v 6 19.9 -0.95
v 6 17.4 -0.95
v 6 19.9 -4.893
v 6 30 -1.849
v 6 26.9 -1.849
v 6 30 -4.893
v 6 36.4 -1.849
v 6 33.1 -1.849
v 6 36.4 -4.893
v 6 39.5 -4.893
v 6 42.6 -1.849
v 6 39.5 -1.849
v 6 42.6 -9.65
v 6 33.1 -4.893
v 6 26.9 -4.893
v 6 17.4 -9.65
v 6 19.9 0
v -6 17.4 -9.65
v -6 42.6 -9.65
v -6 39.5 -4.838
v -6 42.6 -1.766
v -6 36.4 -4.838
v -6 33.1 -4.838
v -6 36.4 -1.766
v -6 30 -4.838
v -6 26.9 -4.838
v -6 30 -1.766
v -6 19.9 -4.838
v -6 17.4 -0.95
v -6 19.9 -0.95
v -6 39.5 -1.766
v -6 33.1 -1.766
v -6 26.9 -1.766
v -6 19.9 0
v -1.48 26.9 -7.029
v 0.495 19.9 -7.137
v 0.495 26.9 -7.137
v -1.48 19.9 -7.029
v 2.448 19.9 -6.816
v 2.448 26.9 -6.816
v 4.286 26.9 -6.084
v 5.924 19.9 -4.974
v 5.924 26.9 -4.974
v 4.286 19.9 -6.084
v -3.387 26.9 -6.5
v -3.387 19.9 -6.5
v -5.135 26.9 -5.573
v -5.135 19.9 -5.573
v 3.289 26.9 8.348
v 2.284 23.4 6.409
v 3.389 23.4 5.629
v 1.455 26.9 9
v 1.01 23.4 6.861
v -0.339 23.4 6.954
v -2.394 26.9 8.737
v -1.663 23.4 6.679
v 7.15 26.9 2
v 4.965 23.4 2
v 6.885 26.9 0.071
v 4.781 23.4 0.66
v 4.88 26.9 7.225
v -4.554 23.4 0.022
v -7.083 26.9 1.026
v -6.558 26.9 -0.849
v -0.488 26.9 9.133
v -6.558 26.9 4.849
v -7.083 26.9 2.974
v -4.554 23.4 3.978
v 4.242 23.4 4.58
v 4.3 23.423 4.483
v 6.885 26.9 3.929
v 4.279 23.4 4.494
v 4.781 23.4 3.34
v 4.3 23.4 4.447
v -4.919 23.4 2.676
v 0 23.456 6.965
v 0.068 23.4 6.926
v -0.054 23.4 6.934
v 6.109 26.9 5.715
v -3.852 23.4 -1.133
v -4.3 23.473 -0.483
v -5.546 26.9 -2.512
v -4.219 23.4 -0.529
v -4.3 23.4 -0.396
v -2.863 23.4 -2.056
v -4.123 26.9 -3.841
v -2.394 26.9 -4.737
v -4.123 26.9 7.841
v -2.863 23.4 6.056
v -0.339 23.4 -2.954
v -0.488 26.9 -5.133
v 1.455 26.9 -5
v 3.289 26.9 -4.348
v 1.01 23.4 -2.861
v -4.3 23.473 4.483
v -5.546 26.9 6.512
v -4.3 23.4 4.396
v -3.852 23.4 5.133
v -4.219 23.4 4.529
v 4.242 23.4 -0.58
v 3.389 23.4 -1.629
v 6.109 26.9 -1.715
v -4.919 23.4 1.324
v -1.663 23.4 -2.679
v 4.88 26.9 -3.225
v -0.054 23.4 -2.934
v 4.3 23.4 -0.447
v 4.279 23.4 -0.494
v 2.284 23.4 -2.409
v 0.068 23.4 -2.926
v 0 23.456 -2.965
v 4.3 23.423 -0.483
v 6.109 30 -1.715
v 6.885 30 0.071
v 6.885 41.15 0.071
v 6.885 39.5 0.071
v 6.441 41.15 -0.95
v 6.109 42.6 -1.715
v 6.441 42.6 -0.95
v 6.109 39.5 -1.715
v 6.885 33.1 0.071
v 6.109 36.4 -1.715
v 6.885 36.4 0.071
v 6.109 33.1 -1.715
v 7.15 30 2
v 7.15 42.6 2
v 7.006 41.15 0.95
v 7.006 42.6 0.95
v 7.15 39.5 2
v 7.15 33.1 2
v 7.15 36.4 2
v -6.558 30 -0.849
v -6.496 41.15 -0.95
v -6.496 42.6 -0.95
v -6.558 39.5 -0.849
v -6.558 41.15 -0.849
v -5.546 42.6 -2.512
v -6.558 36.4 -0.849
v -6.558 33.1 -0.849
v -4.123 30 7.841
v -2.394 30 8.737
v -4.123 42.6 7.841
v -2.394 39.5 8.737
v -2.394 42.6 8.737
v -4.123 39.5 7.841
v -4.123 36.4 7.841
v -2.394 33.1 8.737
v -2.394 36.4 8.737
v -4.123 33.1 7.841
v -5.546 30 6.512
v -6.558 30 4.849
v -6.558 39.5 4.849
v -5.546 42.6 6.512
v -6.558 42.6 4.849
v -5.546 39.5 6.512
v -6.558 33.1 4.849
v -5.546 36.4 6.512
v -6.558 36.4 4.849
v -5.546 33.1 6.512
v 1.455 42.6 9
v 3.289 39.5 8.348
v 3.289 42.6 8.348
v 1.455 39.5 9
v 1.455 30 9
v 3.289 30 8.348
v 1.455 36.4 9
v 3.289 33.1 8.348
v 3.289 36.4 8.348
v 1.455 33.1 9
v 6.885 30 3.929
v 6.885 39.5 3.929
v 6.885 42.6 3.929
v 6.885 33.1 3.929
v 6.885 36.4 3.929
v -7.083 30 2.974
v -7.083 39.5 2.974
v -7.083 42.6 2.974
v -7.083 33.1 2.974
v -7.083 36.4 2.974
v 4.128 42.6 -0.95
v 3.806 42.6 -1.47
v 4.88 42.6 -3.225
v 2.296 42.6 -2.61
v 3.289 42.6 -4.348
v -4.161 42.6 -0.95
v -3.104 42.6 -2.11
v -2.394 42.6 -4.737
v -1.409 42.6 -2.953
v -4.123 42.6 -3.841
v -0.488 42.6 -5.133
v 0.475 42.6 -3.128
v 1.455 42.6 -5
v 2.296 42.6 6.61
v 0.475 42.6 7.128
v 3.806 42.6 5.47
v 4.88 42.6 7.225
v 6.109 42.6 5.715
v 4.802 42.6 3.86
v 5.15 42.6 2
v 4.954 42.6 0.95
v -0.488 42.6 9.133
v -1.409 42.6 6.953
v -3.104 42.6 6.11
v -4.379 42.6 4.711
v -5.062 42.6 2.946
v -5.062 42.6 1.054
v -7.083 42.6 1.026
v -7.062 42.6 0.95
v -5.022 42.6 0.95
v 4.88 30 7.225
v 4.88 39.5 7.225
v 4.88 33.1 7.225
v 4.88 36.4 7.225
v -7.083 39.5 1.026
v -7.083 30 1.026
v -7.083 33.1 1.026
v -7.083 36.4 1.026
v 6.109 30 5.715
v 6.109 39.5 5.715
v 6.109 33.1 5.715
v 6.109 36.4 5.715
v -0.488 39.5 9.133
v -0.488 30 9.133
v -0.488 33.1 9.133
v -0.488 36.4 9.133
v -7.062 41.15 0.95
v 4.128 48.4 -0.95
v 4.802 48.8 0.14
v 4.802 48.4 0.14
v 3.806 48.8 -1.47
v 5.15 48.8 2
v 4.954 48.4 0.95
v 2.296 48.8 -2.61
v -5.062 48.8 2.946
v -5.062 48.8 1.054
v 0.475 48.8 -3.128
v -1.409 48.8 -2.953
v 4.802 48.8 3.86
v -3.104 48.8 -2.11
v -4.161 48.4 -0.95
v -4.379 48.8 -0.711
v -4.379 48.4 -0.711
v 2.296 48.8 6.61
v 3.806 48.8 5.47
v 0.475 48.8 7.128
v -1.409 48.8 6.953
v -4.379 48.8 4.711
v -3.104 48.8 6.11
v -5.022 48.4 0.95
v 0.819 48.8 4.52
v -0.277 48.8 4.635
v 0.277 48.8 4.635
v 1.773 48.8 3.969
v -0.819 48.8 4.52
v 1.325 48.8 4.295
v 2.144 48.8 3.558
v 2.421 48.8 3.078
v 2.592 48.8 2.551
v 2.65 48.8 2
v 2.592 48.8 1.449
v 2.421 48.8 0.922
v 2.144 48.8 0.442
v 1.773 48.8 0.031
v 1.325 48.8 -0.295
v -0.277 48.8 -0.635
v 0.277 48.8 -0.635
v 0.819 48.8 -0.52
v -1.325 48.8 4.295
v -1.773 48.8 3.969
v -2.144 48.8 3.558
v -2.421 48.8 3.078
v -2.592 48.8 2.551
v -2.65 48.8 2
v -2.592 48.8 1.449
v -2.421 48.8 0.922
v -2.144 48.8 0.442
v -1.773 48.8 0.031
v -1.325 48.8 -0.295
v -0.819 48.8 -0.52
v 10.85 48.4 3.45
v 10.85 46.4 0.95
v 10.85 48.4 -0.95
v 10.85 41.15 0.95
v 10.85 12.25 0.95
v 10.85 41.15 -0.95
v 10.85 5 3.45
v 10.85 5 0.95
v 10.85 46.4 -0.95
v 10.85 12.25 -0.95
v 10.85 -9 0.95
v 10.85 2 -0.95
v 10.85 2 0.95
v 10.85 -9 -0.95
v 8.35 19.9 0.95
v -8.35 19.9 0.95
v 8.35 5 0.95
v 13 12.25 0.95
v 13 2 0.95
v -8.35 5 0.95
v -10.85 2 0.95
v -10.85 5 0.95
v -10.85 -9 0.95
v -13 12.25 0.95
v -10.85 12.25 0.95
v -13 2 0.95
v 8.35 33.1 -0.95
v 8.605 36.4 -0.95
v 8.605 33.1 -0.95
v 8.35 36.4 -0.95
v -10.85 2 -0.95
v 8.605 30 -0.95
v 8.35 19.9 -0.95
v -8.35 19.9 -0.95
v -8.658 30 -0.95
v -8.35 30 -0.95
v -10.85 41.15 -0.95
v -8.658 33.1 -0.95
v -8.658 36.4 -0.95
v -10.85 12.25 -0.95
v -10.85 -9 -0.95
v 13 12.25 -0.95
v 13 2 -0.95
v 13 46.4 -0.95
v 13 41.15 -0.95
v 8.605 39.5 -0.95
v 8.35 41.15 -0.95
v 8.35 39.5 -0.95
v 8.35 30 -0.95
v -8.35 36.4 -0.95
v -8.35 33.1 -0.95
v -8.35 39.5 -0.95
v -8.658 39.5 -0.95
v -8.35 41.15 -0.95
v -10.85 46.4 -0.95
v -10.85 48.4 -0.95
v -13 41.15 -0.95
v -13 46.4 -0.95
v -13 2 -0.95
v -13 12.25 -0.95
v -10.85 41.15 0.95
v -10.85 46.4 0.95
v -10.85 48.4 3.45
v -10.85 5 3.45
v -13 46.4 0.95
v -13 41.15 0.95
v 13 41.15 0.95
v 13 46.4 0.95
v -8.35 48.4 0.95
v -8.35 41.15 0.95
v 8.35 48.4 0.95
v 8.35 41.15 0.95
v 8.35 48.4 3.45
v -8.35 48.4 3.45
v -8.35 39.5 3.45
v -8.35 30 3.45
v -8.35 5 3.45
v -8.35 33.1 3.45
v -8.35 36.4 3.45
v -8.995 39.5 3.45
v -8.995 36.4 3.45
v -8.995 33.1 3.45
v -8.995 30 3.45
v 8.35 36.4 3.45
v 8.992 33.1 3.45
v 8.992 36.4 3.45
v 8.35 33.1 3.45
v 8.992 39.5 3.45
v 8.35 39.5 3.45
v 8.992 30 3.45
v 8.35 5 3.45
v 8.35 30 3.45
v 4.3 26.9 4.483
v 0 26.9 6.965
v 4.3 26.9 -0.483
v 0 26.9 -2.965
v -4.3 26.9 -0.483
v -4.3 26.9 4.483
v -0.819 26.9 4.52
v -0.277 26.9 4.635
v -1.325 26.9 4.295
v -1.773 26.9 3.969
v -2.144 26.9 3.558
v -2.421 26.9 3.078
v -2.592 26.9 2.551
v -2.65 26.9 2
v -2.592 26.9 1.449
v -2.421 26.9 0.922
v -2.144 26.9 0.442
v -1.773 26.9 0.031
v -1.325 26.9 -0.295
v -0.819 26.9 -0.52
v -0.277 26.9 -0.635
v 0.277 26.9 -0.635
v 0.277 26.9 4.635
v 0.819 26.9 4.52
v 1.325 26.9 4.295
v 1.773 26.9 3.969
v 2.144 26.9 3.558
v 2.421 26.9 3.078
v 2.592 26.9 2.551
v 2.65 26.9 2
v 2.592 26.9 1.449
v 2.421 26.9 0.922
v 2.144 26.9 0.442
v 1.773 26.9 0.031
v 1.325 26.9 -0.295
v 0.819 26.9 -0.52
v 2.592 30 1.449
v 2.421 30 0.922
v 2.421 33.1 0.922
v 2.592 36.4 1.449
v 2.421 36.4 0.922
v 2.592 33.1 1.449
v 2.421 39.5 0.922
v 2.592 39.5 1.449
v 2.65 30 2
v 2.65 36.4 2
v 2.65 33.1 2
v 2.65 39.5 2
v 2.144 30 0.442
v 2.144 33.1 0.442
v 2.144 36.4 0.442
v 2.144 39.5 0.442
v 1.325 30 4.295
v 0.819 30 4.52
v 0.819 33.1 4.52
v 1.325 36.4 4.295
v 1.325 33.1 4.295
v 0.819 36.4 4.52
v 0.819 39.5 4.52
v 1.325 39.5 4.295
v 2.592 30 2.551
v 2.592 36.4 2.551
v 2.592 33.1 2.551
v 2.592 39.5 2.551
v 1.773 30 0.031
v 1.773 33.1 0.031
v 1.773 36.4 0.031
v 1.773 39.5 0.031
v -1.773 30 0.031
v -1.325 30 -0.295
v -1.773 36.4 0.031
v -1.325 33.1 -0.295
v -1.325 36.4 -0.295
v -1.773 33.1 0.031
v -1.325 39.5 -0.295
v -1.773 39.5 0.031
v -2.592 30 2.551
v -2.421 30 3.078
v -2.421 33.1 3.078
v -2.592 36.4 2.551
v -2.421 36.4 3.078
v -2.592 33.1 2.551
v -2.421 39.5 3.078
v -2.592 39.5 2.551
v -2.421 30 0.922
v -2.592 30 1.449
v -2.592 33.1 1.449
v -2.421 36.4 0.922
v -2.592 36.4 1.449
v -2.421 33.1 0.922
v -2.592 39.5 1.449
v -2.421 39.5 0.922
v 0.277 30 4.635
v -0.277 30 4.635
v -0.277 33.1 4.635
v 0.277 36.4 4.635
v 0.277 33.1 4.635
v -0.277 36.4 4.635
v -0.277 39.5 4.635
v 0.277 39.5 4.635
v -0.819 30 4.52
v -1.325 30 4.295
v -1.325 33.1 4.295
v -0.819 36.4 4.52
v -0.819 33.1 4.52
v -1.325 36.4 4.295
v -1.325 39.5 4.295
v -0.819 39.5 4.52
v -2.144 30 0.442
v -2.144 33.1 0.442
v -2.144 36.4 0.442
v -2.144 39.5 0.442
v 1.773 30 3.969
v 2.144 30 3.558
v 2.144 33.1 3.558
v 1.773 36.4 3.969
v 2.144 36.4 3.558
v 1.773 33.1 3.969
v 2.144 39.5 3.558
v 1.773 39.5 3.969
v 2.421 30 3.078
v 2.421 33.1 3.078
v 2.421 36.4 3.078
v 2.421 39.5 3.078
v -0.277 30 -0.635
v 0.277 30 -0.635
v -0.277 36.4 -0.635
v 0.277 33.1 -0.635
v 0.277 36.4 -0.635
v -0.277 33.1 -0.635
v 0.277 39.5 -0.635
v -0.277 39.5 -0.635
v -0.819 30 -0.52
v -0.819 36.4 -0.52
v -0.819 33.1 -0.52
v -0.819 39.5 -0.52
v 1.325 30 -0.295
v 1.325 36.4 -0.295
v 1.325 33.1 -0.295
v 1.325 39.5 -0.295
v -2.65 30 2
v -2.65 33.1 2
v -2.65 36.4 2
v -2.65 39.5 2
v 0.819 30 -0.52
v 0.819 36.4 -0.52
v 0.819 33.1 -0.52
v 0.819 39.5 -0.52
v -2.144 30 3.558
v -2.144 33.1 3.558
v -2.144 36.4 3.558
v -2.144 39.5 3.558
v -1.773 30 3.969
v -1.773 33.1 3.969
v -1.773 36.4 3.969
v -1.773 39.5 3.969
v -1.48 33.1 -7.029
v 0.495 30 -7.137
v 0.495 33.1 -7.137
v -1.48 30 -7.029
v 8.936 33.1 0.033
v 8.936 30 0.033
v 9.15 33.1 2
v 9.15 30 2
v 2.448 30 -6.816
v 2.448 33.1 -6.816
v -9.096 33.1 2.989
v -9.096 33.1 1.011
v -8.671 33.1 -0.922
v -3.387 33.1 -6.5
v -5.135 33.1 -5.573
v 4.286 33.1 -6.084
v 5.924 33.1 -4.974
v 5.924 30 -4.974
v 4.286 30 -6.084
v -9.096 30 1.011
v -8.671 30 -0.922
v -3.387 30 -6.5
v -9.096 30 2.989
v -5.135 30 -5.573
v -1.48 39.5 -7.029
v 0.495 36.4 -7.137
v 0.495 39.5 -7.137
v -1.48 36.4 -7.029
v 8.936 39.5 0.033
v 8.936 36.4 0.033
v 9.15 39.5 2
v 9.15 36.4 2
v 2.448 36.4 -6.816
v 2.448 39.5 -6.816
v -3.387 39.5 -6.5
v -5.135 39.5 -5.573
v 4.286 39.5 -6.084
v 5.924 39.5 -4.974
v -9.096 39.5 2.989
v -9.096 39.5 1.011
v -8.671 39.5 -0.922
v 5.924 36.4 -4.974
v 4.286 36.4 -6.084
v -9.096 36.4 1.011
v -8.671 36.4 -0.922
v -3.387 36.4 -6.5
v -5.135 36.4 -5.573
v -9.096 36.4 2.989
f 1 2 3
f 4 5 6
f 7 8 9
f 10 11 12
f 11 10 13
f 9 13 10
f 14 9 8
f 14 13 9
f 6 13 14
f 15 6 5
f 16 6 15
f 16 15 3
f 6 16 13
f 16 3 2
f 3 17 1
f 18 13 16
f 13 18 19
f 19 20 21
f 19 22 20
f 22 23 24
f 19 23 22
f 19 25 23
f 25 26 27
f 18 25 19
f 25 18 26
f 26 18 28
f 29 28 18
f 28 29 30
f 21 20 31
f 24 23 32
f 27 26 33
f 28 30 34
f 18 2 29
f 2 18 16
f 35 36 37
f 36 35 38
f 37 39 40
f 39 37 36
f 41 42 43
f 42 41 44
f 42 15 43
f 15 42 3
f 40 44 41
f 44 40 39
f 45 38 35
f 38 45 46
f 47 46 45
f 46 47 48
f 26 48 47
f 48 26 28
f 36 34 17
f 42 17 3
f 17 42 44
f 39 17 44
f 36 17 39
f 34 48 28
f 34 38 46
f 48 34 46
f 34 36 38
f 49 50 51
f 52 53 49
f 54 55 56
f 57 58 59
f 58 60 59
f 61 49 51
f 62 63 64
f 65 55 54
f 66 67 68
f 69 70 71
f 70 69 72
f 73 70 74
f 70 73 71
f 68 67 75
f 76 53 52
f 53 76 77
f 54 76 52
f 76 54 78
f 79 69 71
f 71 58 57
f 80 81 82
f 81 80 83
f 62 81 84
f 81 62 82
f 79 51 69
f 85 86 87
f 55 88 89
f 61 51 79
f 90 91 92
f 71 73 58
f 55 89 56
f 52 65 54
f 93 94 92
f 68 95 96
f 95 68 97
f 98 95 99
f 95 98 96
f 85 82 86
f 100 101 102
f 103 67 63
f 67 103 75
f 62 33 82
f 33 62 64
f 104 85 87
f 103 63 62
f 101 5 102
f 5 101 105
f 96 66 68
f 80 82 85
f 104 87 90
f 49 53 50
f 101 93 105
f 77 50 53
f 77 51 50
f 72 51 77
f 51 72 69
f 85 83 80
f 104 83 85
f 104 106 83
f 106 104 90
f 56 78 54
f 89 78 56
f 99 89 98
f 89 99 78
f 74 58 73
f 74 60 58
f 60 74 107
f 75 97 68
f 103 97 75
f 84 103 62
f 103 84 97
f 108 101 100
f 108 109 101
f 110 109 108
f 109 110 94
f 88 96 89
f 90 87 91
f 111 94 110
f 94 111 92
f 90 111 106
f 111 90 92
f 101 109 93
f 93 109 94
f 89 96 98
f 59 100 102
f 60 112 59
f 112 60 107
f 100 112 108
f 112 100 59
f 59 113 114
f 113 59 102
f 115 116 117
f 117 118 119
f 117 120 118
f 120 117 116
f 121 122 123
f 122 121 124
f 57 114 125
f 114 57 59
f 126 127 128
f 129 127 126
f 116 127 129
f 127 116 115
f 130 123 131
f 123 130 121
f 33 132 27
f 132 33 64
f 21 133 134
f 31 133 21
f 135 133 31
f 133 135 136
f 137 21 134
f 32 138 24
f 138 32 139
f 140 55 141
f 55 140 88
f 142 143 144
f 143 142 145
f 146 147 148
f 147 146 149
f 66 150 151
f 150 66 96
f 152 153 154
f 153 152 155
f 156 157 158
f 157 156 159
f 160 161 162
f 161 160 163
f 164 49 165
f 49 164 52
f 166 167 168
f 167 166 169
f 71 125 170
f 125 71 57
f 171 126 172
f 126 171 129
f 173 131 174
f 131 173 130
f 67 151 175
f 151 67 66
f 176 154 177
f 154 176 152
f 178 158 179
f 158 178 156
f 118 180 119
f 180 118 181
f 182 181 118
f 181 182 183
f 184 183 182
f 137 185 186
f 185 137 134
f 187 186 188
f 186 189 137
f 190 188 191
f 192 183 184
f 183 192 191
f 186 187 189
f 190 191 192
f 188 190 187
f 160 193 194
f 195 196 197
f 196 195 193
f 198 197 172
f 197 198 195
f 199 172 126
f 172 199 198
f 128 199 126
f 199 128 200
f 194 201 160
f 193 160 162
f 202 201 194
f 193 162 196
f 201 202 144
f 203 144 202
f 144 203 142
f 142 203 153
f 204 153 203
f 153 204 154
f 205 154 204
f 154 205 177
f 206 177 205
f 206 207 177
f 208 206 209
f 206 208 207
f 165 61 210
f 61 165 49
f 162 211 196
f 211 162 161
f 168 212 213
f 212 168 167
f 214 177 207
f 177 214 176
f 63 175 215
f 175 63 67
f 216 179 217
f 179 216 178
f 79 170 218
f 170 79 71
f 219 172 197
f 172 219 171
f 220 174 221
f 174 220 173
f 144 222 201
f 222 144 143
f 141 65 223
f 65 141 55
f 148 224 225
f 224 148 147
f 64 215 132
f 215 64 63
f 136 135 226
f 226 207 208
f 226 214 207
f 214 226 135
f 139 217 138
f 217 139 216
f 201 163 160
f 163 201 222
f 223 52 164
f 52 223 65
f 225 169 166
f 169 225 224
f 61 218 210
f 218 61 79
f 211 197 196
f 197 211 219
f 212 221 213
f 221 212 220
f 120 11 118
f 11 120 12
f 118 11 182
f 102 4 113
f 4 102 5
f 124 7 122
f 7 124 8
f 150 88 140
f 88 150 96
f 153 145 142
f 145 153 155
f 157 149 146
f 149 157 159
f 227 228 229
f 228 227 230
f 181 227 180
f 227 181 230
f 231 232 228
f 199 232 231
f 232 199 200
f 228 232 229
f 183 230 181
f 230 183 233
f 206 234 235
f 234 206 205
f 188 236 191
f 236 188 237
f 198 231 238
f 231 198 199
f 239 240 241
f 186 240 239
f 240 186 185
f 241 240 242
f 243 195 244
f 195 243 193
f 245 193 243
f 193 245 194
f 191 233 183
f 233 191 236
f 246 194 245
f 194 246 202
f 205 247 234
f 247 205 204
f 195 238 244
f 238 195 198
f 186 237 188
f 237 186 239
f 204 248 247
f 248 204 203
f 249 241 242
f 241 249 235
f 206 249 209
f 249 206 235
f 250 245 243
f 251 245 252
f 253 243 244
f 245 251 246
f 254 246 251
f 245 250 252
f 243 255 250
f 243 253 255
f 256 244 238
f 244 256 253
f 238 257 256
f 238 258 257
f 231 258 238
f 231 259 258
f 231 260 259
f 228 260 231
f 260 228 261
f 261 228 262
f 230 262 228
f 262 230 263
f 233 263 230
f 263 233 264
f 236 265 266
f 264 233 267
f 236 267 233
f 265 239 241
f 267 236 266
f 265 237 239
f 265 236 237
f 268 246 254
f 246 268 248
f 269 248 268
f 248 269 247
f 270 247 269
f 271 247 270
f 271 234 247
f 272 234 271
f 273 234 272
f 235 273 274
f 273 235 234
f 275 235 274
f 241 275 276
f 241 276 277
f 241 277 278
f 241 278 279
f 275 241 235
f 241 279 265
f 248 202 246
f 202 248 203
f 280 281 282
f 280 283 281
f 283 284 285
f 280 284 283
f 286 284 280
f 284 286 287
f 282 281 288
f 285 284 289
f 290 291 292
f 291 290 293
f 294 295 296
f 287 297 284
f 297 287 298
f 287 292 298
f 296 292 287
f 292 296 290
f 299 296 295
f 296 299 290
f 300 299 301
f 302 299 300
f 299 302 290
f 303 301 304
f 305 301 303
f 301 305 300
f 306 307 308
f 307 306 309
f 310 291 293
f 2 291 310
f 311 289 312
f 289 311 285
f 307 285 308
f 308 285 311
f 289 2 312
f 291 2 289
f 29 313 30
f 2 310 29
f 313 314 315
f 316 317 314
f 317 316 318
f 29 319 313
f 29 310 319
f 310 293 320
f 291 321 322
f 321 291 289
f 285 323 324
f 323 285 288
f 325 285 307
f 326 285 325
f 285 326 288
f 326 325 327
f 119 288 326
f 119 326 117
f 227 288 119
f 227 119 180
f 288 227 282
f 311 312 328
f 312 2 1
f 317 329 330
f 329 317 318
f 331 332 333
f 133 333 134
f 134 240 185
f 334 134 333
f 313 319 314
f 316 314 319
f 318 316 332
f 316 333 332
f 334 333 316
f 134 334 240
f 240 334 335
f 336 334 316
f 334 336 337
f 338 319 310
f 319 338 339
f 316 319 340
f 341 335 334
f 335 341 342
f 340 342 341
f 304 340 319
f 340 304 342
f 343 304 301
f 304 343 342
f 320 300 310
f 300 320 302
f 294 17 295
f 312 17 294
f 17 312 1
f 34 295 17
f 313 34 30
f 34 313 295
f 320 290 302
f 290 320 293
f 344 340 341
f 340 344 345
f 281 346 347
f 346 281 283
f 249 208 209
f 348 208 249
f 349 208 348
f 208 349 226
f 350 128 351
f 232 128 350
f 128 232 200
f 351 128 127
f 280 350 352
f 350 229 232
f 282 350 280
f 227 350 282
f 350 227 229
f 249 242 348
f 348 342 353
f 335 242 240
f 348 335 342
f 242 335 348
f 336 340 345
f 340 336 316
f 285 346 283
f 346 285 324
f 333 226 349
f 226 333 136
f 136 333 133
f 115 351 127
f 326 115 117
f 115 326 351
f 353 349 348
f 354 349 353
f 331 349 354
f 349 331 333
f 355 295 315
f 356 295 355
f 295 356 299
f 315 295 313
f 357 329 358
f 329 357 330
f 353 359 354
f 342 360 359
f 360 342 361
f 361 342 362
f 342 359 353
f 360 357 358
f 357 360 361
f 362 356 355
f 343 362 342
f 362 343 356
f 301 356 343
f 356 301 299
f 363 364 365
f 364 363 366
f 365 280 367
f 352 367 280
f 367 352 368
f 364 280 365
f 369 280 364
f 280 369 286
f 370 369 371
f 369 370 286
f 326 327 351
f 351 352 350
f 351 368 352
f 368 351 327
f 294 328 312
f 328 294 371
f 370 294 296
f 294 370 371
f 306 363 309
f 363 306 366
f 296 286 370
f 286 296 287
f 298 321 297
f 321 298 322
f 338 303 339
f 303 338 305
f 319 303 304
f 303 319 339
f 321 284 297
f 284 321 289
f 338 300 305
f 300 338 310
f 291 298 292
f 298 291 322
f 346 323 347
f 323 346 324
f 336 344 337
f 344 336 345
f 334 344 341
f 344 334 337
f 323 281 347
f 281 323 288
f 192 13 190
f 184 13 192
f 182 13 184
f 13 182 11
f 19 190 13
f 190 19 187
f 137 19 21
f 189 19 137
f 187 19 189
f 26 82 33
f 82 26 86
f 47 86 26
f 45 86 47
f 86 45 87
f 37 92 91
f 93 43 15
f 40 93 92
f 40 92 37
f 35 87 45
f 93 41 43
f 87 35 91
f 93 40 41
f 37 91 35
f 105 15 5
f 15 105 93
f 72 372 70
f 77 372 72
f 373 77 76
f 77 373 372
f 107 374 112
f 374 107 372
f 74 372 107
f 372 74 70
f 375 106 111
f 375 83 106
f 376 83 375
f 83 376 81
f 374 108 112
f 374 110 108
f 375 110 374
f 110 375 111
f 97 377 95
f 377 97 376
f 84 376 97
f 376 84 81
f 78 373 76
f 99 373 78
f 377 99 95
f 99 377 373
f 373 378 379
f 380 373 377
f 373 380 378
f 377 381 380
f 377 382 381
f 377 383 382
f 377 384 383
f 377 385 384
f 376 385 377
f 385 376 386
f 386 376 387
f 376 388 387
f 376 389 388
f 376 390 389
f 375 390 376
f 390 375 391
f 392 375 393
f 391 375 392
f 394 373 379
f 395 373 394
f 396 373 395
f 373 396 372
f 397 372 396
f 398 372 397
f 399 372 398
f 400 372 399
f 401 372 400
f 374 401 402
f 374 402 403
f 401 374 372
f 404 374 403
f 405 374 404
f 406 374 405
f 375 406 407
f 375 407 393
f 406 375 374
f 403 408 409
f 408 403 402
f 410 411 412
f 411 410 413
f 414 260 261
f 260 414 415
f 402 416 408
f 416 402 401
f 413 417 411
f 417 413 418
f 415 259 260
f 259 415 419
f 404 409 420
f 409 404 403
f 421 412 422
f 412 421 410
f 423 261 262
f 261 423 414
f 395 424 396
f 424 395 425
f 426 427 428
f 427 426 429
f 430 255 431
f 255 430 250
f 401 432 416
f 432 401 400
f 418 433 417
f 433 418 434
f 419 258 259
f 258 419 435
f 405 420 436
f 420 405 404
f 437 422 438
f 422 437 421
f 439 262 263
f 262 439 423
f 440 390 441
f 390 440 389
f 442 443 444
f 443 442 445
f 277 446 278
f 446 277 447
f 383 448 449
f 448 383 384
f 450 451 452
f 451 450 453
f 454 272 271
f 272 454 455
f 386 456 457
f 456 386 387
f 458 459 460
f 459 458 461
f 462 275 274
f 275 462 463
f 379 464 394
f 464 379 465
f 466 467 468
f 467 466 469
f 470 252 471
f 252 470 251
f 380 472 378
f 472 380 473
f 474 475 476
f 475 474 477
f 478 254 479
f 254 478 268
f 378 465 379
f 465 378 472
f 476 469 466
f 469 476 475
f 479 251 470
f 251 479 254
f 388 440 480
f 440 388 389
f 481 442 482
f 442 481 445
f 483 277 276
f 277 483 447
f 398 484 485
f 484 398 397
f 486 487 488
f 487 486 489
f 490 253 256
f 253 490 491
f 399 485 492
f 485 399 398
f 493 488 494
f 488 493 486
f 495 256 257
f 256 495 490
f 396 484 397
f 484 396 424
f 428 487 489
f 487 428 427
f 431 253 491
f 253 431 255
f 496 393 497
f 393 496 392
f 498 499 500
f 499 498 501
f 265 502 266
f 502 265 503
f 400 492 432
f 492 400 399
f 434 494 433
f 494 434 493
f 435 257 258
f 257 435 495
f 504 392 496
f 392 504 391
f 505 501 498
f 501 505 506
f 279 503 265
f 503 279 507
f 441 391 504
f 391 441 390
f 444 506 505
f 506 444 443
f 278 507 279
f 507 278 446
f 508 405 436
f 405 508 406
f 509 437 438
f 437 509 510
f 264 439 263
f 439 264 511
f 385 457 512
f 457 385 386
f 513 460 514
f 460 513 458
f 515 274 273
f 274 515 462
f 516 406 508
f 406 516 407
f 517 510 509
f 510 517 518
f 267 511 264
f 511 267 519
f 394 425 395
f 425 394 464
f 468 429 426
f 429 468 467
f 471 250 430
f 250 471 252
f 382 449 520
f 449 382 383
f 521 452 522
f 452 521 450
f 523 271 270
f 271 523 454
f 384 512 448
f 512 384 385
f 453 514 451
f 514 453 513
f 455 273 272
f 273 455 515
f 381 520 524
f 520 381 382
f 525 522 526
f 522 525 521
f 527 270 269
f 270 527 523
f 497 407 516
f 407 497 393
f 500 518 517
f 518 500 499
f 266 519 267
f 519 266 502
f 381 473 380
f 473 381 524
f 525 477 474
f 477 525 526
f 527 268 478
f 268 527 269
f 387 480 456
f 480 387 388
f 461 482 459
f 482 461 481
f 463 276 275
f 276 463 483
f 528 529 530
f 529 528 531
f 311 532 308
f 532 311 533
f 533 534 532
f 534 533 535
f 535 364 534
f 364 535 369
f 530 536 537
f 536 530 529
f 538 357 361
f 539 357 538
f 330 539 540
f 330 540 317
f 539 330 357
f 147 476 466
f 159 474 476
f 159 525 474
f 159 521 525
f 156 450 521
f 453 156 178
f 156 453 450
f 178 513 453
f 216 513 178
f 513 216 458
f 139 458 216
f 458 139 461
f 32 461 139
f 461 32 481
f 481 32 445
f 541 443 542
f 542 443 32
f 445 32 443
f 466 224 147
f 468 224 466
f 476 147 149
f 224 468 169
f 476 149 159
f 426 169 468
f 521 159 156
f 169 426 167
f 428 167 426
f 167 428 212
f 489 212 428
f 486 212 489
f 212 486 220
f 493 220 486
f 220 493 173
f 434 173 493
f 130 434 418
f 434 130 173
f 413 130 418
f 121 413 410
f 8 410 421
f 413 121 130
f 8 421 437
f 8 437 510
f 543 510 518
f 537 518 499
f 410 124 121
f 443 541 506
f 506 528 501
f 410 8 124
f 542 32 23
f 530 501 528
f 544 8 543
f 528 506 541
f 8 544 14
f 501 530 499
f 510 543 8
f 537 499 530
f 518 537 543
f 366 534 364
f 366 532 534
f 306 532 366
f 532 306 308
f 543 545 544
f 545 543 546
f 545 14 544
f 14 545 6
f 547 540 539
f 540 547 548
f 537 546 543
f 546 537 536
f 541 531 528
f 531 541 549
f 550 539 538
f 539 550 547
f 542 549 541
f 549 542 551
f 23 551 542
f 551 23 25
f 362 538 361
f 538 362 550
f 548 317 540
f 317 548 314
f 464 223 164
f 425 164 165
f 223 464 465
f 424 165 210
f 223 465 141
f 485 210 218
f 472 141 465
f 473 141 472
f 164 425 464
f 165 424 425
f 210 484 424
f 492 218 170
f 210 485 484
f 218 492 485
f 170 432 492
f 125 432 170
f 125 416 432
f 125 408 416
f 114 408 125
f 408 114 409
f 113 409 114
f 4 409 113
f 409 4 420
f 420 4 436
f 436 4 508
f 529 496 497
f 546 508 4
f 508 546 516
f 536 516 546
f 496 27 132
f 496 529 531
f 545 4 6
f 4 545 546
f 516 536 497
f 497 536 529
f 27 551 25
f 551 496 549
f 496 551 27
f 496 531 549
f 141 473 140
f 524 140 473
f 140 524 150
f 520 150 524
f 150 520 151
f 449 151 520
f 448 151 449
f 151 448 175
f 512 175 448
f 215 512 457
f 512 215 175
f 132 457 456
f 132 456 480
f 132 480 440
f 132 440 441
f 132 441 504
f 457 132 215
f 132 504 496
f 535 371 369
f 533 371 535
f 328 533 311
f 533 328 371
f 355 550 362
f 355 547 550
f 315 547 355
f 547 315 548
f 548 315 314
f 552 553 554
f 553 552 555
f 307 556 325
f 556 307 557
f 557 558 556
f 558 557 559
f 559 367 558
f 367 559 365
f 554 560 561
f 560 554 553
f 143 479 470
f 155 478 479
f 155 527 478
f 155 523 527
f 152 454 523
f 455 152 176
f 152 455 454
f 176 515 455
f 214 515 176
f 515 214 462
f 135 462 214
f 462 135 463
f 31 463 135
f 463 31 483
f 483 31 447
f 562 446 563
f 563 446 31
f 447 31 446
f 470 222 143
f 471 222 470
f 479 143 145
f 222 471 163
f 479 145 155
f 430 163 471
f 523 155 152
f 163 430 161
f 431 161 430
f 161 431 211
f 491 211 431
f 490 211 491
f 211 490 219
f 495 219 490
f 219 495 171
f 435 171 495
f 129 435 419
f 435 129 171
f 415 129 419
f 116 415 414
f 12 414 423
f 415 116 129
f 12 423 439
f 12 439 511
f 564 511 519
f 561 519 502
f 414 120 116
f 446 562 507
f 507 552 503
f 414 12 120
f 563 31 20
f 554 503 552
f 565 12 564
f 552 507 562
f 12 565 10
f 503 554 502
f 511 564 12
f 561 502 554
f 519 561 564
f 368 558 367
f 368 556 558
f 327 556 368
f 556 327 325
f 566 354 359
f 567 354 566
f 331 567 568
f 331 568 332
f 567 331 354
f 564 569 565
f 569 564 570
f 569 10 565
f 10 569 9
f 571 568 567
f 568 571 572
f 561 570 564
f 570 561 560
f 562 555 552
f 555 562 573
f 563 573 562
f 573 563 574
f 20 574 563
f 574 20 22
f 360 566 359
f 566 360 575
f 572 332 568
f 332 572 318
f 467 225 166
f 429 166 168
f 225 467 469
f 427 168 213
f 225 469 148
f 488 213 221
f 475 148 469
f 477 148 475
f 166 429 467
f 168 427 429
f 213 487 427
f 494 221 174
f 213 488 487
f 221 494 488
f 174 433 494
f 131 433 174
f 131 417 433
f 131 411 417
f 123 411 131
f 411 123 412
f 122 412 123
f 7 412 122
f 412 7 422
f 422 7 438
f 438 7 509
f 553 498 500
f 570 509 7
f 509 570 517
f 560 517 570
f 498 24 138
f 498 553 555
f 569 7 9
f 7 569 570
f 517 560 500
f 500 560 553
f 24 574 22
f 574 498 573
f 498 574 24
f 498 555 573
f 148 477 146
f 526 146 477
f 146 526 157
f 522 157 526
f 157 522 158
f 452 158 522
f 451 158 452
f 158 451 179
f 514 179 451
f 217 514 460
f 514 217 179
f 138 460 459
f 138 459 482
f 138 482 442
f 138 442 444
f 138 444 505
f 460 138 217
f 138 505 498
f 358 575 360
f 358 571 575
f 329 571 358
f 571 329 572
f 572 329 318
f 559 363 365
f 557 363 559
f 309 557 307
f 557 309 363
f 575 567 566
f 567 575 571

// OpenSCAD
//
// mounting bracket for GoPro Hero with housing
// for use on the HobbyKing Brushless ActionCam Gimbal
// http://hobbyking.com/hobbyking/store/__51184__HobbyKing_Brushless_ActionCam_Gimbal_With_2208_Motors_and_3K_Carbon_Construction.html
//
// Design by Egil Kvaleberg, Jan 2015
//


// adjust for best balance:
camera_yoffs = 28.0; // measured from tab1 to nearest camera tab
// adjust for best balance:
camera_zoffs = 2.0; // measured from bracket plane


cbracket_screw = 1*5.3; // M5 with margin
cbracket_circ = 1*4.5; // circumference round screw (5.0)
cbracket_circ2 = 1*6.5; // clearance with margin
cbracket_suppw = 1*12.0; // width of support piece
cbracket_wall = 1*3.1; // 3.0 with clearance
cbracket_dist = 1*3.3; // with clearance
nut_height = 3.5;
nut_af = 1*8.6; // 8mm plus margin

thickness = 1*1.90; // of tabs
wall = 1*2.5;
inner_width = 1*21.7;
outer_width = 1*26.0;
tabs = 1*2.0; 
board_extra = 9.0; // extra space for accelerometer board
tab1 = 1*10.25;
tabd = 1*28.9;
tab2 = 1*5.25;
d = 1*0.01;

module add_this()
{
	// middle section, two parts
	translate([-inner_width/2, -board_extra, -thickness/2]) cube([inner_width, board_extra+tabs+camera_yoffs-cbracket_wall-2*nut_height, thickness]);
	translate([-inner_width/2, tabs+tab1+tabd, -thickness/2]) cube([inner_width, tab2+tabs, thickness]);

	// strengthening bars along edge
	translate([-inner_width/2, tabs+3.0, -thickness/2]) cube([wall, tab1-3.0+tabd+tab2+tabs, wall+thickness]);
	translate([inner_width/2-wall, tabs+3.0, -thickness/2]) cube([wall, tab1-3.0+tabd+tab2+tabs, wall+thickness]);

	// two tabs
	translate([-outer_width/2, tabs, -thickness/2]) cube([outer_width, tab1, thickness]);
	translate([-outer_width/2, tabs+tab1+tabd, -thickness/2]) cube([outer_width, tab2, thickness]);

	// bottom support
	translate([0, tabs+camera_yoffs-cbracket_wall-2*nut_height, camera_zoffs]) difference() {
		translate([-cbracket_suppw/2, -wall, -(cbracket_screw/2 + cbracket_circ2 + wall)]) cube([cbracket_suppw, wall+15.0, wall+cbracket_circ2+cbracket_screw/2-camera_zoffs]);
		rotate([-90, 0, 0]) cylinder(r = cbracket_screw/2 + cbracket_circ2, h=15.0+d);
	}
	translate([-cbracket_suppw/2, tabs+camera_yoffs-cbracket_wall, -(cbracket_screw/2 + cbracket_circ2 + wall)+camera_zoffs]) cube([cbracket_suppw, cbracket_wall+cbracket_wall+cbracket_dist+cbracket_wall+cbracket_wall, wall+ cbracket_circ2]);

	translate([0, tabs+camera_yoffs-cbracket_wall, camera_zoffs]) rotate([-90, 0, 0]) {
		// cage for nut
		translate([0, 0, -nut_height]) {	
			cylinder(r1 = (nut_af/2)/cos(30), r2 = cbracket_screw/2 + cbracket_circ, h=nut_height);
		}
		cylinder(r = cbracket_screw/2 + cbracket_circ, h=cbracket_wall+cbracket_wall+cbracket_dist+cbracket_wall+cbracket_wall);
		translate([0, 0, cbracket_wall+cbracket_wall+cbracket_dist+cbracket_wall+cbracket_wall]) cylinder(r = cbracket_screw/2 + wall, h=2*cbracket_wall);
	}
}

module sub_this()
{
	translate([0, tabs+camera_yoffs-cbracket_wall, camera_zoffs]) rotate([-90, 0, 0]) {
		translate([0, 0, -nut_height]) {	
			rotate([0, 0, 30]) translate([0, 0, -nut_height]) cylinder(r = (nut_af/2)/cos(30), h=nut_height*2, $fn=6);
			cylinder(r = cbracket_screw/2, h=50.0, $fn=30);
		}
		translate([0, 0, cbracket_wall]) cylinder(r = cbracket_screw/2 + cbracket_circ2, h=cbracket_wall);
		translate([0, 0, cbracket_wall+cbracket_wall+cbracket_dist]) cylinder(r = cbracket_screw/2 + cbracket_circ2, h=cbracket_wall);
		translate([0, 0, cbracket_wall+cbracket_wall+cbracket_dist+cbracket_wall+cbracket_wall+3*cbracket_wall]) cylinder(r = cbracket_screw/2 + wall + 0.5, h=cbracket_wall);
	}
}

difference() {
	add_this();
	sub_this();
}
